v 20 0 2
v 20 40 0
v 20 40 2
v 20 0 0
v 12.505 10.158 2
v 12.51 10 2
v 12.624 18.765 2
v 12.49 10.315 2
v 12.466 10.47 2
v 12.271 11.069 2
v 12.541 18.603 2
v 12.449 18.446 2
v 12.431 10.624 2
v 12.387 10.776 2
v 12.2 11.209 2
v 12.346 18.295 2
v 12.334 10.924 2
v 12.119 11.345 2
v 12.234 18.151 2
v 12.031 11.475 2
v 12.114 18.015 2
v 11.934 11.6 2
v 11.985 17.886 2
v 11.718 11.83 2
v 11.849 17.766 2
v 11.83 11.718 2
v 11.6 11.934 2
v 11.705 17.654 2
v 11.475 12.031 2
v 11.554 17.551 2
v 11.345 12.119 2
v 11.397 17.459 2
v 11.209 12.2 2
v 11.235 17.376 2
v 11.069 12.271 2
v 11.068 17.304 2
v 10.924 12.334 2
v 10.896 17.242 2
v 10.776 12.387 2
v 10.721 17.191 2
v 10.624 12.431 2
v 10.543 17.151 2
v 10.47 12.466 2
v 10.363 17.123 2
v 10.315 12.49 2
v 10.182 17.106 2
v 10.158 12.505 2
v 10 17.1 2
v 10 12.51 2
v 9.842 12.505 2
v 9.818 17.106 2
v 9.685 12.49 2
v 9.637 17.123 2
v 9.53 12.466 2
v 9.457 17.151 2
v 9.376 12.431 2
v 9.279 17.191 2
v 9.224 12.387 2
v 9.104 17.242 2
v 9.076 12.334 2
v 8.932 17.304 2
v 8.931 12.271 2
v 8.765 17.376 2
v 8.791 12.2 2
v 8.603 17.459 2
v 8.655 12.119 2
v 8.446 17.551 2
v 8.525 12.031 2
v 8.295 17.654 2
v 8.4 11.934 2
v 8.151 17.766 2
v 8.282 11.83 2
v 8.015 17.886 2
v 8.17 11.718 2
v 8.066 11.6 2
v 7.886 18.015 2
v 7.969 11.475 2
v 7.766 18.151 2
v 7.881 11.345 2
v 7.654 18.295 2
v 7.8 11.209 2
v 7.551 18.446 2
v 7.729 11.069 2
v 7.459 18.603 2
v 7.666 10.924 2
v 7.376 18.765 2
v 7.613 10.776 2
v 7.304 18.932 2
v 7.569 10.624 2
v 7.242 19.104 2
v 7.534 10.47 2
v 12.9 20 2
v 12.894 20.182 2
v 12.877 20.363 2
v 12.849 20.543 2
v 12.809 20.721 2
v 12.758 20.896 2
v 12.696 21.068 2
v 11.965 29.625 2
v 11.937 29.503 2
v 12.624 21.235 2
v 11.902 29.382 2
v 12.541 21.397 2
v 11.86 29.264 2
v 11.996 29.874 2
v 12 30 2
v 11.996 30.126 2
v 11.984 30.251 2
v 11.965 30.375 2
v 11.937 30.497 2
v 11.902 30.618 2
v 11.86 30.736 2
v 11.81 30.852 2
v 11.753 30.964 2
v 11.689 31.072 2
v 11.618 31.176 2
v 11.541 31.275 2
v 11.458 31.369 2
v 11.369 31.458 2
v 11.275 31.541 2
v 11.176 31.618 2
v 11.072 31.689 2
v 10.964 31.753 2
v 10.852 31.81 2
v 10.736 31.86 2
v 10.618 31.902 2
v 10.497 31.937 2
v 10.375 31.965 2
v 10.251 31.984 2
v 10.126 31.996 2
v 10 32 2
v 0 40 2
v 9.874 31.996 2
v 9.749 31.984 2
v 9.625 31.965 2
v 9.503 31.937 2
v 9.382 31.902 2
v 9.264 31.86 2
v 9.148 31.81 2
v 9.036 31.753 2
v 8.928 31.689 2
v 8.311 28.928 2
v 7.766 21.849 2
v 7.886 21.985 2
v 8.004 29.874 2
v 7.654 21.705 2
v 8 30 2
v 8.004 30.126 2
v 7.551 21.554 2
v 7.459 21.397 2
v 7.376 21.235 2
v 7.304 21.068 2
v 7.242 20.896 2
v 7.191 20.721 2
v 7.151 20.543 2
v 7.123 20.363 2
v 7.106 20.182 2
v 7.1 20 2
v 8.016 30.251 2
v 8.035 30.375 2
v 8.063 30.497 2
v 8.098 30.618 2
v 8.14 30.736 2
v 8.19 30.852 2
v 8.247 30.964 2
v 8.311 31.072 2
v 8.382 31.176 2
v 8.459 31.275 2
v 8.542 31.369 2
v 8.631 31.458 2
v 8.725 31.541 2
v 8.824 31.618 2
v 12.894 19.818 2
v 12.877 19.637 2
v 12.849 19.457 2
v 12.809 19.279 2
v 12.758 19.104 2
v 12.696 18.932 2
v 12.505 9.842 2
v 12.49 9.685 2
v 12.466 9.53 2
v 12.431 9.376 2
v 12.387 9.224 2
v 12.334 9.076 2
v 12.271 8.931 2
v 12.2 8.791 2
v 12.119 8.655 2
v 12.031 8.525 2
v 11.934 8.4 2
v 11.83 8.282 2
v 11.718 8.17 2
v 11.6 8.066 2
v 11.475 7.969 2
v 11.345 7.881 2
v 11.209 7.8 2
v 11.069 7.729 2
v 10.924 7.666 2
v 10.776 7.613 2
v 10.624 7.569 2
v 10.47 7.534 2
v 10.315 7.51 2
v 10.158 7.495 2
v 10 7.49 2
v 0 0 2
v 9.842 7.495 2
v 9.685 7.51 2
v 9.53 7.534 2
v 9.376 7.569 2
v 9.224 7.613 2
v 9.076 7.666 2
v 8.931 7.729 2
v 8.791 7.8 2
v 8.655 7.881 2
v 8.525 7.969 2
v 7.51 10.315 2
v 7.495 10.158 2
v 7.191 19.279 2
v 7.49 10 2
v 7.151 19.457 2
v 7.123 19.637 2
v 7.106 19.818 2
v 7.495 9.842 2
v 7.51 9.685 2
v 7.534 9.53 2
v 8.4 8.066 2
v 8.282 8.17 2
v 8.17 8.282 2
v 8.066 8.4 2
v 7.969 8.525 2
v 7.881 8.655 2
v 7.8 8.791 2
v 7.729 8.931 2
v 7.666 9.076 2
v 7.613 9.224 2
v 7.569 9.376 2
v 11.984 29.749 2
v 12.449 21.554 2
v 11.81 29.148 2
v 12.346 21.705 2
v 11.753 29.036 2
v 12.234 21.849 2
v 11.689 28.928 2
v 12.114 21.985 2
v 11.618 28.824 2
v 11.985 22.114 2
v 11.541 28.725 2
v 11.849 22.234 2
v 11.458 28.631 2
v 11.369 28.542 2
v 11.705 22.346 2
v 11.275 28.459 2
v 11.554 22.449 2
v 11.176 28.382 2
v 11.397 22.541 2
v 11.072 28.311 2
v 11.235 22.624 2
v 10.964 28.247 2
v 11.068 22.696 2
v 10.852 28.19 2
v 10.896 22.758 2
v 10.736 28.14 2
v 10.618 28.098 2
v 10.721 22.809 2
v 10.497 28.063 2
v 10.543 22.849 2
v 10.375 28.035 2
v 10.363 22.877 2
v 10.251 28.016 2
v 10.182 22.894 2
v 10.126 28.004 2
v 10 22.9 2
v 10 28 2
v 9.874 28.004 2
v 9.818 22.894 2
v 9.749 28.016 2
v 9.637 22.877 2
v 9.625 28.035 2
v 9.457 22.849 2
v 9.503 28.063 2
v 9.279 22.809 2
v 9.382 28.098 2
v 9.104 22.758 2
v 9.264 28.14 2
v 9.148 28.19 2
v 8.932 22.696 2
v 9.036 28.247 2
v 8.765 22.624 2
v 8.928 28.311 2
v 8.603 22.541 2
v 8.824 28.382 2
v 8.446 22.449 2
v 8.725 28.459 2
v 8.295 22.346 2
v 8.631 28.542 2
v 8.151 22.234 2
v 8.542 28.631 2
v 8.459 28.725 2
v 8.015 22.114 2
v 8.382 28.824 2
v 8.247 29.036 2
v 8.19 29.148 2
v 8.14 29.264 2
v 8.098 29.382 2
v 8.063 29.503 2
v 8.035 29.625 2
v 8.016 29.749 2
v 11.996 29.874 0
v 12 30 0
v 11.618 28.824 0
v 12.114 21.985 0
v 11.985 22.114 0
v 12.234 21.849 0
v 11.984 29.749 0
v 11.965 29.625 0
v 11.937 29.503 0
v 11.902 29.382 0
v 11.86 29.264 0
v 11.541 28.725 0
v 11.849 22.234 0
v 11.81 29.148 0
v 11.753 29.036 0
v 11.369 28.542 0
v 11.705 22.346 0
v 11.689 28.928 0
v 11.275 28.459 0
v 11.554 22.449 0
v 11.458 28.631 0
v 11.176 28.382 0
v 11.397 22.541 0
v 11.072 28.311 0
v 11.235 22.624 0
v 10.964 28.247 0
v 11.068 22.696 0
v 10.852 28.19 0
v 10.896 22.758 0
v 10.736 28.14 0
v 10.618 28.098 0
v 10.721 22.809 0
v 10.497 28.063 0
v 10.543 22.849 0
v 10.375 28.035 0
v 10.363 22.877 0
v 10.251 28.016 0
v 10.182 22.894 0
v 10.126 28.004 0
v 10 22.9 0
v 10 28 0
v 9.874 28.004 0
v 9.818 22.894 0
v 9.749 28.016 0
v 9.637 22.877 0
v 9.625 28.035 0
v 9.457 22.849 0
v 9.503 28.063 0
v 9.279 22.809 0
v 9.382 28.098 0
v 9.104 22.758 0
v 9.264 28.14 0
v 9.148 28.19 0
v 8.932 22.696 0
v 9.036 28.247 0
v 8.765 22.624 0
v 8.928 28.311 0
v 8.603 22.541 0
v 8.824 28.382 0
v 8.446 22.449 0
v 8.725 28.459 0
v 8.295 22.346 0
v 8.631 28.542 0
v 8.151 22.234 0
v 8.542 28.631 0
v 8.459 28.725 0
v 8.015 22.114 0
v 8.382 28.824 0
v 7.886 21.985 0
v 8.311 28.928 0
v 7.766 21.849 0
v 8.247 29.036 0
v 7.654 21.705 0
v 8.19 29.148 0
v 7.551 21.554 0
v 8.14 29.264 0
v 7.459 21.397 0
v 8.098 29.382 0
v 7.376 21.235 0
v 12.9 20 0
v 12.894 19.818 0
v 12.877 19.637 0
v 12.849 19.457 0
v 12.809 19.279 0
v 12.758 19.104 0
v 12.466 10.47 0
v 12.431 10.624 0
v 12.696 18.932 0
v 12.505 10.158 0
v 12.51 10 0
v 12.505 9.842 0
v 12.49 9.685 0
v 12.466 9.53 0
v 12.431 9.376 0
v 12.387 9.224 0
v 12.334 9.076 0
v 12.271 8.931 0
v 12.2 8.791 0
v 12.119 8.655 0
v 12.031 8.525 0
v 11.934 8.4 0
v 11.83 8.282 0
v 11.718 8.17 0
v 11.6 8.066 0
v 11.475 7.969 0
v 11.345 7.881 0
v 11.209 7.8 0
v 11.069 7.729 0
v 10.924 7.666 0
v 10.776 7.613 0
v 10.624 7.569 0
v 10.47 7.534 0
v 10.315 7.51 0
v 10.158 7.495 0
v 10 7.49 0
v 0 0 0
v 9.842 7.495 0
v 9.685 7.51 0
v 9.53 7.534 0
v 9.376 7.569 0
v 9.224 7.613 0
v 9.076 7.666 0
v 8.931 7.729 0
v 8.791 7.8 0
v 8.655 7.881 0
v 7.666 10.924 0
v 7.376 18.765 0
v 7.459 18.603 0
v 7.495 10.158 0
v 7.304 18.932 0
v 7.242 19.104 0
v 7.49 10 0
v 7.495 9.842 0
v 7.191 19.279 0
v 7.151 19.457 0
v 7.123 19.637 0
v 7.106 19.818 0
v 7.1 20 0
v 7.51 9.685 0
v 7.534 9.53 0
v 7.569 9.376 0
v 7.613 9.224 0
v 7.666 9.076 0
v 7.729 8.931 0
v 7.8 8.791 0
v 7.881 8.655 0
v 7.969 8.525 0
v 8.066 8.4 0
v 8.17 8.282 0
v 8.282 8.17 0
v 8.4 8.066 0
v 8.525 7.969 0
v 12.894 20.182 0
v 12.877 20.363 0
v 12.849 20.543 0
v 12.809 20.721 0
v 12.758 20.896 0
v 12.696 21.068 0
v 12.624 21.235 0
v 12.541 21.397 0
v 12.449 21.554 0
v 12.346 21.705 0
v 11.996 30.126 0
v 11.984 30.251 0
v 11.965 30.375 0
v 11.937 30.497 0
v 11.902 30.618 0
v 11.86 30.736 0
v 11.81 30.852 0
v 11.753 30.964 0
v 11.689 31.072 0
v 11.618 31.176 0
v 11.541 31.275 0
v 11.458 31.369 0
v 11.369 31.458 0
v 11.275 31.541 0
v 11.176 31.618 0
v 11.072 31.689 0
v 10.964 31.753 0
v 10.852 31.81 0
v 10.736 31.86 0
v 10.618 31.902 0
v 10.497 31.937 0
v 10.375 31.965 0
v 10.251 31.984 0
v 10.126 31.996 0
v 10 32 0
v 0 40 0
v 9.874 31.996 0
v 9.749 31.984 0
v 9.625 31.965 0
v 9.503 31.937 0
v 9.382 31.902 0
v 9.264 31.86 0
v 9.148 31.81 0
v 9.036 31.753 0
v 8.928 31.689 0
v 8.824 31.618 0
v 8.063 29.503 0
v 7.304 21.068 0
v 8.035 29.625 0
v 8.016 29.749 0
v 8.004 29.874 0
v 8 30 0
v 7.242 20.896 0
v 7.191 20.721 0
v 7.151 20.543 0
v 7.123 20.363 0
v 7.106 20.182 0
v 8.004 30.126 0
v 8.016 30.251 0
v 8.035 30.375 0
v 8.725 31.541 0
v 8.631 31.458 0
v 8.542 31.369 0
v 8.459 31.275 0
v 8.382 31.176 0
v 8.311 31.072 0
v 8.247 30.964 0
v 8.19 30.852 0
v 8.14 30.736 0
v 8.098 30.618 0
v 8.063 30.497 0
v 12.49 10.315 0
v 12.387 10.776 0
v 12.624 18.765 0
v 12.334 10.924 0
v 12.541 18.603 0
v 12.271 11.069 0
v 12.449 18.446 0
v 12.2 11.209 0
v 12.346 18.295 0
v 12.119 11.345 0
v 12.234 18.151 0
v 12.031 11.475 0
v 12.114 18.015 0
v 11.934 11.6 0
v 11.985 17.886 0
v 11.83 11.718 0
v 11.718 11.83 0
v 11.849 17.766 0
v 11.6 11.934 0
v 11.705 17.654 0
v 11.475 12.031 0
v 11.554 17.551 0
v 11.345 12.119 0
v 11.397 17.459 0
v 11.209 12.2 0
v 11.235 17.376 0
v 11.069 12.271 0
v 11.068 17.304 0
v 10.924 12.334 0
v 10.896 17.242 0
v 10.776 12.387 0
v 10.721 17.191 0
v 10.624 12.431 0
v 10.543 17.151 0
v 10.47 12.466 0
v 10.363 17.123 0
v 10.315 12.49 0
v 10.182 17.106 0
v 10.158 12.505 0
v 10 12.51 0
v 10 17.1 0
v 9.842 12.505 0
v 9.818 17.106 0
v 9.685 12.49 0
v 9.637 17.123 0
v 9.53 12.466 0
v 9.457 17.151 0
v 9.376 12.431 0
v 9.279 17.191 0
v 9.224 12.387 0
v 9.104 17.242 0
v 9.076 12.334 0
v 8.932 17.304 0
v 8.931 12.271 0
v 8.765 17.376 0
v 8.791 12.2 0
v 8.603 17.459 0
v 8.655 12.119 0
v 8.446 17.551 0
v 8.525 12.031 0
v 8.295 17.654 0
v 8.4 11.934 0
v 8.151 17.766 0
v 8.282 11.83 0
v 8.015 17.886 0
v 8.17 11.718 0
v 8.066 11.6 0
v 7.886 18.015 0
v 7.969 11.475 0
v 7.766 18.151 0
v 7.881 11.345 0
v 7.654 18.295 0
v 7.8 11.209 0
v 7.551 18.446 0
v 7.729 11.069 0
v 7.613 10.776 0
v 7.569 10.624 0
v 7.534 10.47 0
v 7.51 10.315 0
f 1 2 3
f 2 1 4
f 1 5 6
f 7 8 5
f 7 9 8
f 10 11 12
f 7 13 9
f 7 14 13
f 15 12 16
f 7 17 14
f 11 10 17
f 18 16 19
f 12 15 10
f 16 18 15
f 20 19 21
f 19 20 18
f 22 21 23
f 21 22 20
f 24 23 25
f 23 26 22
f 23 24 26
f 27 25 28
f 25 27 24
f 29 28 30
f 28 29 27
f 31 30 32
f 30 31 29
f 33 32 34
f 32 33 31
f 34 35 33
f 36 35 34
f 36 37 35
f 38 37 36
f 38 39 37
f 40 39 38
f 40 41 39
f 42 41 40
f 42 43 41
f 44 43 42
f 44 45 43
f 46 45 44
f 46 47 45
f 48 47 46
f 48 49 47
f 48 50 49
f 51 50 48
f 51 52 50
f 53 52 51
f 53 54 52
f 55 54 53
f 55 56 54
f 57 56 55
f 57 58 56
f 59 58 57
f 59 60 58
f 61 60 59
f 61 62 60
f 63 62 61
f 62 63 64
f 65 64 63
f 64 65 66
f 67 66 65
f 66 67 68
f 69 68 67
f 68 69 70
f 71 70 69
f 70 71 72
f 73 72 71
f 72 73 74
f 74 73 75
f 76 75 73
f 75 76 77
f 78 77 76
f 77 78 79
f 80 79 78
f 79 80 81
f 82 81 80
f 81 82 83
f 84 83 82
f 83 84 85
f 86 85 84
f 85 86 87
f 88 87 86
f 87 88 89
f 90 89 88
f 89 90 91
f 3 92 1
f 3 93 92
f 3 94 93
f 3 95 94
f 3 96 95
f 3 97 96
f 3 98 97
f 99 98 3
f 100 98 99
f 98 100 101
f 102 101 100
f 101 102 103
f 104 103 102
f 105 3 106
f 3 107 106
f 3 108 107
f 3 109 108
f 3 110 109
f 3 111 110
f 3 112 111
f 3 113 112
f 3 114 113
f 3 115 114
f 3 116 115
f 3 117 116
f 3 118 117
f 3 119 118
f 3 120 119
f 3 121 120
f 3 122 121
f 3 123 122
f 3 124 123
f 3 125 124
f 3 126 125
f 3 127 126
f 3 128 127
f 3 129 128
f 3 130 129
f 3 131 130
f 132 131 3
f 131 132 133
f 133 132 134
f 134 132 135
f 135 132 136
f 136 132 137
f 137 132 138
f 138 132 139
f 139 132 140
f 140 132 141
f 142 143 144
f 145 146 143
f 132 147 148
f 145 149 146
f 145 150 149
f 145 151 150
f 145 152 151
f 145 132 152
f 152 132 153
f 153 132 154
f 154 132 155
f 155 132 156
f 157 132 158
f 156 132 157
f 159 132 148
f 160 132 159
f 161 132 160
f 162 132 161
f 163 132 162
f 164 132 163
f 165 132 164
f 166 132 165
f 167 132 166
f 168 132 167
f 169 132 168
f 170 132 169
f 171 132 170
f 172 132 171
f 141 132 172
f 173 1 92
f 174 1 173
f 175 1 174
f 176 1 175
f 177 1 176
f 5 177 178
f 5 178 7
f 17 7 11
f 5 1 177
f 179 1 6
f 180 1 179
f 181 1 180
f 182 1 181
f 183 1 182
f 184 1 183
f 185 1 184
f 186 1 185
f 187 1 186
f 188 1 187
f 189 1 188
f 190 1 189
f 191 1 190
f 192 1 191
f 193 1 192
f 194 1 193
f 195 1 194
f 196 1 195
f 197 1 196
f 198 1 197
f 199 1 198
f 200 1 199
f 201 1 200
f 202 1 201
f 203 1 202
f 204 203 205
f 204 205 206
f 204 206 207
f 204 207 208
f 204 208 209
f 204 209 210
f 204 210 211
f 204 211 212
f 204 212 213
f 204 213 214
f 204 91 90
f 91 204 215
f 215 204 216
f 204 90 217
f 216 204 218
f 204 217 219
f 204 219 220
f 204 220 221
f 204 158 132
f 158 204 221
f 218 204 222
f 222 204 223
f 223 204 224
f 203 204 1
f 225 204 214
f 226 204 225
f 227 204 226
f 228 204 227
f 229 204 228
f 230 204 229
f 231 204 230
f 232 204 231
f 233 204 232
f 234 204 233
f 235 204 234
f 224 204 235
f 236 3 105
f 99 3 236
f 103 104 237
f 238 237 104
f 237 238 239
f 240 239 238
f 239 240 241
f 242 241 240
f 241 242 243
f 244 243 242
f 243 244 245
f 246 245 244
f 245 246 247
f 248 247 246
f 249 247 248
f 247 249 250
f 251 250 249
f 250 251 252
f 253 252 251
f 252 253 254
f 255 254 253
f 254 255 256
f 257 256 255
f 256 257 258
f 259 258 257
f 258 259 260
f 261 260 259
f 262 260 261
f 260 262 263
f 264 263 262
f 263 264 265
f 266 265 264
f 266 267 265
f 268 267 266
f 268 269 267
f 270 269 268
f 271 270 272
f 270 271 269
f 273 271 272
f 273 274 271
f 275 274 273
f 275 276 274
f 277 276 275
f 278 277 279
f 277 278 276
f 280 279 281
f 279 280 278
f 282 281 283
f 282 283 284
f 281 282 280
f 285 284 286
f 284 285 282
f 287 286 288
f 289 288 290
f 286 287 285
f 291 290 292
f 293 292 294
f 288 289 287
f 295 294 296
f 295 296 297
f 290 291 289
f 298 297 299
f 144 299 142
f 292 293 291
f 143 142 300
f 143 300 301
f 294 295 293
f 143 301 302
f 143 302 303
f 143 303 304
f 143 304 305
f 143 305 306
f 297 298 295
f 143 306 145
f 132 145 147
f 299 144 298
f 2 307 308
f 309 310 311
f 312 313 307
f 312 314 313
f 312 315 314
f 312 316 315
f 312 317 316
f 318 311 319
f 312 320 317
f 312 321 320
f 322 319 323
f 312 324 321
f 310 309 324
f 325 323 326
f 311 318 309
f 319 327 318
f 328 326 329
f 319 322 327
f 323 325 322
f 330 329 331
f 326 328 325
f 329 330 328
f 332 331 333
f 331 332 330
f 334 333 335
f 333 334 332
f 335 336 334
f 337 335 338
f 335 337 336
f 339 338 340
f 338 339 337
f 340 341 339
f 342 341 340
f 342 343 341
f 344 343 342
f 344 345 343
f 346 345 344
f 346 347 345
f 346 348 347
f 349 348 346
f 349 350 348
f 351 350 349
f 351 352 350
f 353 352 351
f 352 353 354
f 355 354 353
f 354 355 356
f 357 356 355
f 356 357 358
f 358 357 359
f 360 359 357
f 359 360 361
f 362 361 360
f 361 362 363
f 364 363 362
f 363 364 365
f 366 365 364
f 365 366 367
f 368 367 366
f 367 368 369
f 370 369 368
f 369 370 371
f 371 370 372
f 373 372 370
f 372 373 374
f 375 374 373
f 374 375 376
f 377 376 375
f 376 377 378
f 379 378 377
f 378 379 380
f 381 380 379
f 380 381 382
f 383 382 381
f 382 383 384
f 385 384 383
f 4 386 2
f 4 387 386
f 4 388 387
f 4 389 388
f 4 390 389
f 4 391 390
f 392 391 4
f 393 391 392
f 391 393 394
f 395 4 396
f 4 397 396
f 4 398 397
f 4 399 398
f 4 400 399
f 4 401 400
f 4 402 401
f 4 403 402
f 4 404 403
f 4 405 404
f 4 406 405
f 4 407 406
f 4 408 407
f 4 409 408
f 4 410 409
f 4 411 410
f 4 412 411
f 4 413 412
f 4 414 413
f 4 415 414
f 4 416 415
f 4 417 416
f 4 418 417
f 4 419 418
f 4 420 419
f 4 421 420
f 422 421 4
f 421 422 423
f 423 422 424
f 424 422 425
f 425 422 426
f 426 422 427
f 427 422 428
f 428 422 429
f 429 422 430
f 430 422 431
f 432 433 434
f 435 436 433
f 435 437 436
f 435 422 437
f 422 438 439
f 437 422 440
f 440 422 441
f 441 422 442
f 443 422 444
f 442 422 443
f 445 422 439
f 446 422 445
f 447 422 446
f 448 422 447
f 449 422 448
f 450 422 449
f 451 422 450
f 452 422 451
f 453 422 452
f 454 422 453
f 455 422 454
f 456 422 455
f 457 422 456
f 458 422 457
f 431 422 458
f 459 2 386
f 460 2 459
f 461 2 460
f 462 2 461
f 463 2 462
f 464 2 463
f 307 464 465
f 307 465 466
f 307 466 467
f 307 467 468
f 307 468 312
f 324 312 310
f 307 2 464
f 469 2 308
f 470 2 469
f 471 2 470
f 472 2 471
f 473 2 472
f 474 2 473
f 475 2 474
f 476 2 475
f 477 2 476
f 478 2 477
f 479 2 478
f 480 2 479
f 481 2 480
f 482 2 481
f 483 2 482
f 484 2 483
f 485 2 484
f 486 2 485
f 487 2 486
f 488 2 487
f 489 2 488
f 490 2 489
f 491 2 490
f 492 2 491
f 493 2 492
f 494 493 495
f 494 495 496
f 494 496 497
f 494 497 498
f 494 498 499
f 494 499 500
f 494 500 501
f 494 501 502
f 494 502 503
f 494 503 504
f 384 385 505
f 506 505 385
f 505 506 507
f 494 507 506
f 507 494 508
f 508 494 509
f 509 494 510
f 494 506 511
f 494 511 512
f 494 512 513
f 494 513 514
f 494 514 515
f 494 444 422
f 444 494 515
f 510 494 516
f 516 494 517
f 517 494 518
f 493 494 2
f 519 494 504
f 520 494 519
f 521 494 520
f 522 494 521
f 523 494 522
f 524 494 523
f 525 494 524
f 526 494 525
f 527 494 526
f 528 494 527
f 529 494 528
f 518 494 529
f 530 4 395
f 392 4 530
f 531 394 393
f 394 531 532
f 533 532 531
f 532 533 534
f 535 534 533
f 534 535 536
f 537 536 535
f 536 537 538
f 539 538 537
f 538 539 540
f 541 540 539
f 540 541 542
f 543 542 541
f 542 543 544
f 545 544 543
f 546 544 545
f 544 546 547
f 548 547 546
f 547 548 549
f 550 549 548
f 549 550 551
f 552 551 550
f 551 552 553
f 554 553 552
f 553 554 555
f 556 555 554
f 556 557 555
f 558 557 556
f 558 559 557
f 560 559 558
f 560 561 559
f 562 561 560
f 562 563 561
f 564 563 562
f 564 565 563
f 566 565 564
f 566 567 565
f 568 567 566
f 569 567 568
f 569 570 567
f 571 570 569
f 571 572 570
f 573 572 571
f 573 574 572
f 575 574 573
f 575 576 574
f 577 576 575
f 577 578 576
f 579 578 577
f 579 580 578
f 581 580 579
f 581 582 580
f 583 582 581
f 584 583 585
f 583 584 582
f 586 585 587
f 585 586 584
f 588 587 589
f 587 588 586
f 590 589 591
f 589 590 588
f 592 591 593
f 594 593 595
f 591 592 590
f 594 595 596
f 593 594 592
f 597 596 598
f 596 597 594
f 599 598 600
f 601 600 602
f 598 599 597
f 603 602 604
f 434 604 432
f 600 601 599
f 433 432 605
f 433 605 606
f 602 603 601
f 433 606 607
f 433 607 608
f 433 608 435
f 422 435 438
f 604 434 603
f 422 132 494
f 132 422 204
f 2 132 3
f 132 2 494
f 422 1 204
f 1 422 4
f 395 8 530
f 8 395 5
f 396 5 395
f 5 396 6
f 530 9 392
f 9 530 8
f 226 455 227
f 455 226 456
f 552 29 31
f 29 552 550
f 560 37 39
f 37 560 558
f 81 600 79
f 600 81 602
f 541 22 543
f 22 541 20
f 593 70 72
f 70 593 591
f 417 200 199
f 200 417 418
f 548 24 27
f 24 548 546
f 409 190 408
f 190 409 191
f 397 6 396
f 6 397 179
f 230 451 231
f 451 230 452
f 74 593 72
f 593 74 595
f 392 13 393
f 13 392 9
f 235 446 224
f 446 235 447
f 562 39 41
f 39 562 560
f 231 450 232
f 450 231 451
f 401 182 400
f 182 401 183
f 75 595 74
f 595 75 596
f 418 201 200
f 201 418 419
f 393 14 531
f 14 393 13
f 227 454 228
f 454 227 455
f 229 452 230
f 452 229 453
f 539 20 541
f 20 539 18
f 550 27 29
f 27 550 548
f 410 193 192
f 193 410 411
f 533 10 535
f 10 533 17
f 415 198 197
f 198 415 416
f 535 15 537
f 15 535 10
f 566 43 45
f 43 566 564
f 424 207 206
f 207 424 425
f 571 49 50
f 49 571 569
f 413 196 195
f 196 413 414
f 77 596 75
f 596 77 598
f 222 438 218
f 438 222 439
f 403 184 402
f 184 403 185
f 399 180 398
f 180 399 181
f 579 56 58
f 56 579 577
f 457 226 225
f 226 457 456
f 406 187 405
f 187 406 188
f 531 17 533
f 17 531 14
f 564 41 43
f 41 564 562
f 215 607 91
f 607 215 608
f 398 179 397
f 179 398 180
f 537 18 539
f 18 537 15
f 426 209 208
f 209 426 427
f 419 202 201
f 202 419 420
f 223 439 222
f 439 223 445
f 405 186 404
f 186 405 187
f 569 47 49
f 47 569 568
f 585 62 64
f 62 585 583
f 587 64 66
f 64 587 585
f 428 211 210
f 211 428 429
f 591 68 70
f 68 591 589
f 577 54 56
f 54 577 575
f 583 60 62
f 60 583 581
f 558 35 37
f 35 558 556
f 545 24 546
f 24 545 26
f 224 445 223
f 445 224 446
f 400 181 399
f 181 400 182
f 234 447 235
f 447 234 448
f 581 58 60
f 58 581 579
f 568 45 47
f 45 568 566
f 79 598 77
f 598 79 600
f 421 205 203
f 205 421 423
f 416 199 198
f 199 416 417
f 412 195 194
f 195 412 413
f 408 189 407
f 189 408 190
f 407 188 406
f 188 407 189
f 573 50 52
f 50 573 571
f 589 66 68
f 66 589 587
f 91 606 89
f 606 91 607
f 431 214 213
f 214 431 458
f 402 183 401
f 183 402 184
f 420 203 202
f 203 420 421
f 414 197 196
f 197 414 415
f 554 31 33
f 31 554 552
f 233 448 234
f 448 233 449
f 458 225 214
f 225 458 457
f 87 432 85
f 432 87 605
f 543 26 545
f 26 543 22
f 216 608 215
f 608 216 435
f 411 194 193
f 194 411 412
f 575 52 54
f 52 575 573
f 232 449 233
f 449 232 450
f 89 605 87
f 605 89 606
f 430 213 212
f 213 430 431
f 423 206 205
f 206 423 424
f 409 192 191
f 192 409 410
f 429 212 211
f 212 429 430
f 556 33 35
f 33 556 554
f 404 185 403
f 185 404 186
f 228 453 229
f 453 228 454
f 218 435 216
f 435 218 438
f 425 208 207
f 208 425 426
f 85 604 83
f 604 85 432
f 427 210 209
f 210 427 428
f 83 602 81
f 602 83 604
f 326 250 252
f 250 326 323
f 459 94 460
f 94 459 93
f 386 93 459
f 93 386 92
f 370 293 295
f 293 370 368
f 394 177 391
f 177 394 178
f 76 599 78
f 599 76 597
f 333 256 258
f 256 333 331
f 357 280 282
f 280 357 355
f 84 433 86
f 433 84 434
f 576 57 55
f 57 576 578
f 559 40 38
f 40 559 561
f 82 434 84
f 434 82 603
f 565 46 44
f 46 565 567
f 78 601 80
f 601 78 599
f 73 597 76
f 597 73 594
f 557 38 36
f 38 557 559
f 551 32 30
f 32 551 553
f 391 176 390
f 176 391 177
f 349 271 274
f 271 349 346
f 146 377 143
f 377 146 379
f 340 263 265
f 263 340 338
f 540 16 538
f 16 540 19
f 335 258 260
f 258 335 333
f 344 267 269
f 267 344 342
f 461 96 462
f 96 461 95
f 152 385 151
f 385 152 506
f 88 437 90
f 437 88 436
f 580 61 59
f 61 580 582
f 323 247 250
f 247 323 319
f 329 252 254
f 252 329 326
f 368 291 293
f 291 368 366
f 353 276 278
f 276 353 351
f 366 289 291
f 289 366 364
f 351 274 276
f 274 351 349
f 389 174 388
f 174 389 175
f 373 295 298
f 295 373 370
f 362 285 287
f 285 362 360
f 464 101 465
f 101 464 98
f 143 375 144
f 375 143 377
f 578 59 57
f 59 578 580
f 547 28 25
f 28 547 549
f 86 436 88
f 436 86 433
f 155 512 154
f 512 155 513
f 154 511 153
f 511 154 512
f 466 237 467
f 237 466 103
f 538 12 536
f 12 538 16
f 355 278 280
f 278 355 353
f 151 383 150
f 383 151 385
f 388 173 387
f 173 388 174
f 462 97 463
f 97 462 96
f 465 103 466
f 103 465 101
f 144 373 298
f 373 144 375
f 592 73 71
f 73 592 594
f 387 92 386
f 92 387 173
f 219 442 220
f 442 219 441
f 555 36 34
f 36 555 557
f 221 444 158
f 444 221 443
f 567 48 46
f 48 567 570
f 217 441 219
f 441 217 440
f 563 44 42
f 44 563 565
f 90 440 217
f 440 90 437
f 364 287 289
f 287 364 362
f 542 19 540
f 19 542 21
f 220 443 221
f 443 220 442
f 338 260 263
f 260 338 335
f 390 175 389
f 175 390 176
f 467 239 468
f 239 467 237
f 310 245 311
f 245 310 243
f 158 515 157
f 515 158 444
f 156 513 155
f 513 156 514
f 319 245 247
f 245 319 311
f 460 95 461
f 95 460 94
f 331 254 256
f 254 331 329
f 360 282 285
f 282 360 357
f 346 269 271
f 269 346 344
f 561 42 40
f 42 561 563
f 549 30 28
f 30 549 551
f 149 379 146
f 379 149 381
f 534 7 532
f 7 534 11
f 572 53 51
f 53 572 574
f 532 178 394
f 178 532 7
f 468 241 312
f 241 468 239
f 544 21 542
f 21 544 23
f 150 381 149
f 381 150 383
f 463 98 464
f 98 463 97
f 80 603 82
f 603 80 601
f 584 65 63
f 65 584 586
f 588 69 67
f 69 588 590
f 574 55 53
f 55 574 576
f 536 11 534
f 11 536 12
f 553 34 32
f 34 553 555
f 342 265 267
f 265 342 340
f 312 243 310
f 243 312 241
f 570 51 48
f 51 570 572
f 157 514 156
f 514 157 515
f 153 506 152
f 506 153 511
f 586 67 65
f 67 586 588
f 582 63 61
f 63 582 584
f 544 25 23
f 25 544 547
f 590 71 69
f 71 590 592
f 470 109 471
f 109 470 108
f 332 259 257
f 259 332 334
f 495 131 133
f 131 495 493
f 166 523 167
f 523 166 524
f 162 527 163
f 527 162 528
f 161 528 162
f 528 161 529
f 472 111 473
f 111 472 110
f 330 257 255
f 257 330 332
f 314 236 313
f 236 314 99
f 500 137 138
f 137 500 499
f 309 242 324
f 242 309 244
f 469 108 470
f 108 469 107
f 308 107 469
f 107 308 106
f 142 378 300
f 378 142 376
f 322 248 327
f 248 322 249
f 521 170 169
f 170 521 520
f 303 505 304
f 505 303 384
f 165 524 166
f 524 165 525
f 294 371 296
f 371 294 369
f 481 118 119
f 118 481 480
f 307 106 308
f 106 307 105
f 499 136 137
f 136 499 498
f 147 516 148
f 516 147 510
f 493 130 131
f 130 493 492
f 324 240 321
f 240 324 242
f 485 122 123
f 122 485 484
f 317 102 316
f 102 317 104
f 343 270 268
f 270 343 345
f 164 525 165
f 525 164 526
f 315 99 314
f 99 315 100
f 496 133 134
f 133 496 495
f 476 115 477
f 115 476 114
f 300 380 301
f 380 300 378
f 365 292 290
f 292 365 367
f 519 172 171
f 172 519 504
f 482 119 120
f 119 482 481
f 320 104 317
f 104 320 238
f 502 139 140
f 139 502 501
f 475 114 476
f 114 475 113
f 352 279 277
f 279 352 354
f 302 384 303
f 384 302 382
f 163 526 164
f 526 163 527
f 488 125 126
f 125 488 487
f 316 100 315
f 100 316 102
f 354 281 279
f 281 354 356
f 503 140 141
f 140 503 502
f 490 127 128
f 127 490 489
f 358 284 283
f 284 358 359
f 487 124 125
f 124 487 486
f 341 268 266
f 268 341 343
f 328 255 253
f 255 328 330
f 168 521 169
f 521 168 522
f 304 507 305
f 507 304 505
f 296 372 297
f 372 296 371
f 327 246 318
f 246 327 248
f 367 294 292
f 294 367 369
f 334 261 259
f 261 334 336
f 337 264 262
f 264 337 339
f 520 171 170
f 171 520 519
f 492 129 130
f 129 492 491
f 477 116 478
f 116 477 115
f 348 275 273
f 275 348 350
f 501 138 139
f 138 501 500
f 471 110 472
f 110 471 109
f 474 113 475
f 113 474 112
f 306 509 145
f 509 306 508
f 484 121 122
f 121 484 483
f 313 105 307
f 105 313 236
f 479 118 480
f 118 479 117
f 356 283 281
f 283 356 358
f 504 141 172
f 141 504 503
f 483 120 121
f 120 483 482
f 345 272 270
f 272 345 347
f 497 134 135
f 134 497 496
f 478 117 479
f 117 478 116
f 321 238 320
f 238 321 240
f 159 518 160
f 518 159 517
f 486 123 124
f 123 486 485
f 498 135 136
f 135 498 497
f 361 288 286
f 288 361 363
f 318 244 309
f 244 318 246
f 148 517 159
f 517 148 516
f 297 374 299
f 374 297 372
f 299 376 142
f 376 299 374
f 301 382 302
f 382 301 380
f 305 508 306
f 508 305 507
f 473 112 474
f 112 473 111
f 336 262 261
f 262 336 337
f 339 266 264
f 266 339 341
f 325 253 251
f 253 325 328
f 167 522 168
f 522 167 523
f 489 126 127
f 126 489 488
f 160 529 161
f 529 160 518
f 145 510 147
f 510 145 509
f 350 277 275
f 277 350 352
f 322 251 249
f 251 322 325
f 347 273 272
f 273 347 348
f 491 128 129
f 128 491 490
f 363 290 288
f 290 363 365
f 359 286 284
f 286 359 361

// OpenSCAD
$fn = 100;
difference() {
cube([20, 40, 2]);
translate([10, 10, -1]) {
    cylinder(10, 2.51, 2.51);
}
translate([10, 20, -1]) {
    cylinder(10, 2.9, 2.9);
}
translate([10, 30, -1]) {
    cylinder(10, 2, 2);
}

}
/*difference() {
  cube([5, 35, 20]);
    translate([-1, 10, 12]) {
    rotate([0, 90, 0]) {
    cylinder(10, 2.51, 2.51);
    }
}

}
*/



/*difference() {
translate([40, 0, 0]) {
    cylinder(140, 5, 5);
}
translate([40, 0, 0]) {
    cylinder(160, 2.5, 2.5);
}
}
*/
